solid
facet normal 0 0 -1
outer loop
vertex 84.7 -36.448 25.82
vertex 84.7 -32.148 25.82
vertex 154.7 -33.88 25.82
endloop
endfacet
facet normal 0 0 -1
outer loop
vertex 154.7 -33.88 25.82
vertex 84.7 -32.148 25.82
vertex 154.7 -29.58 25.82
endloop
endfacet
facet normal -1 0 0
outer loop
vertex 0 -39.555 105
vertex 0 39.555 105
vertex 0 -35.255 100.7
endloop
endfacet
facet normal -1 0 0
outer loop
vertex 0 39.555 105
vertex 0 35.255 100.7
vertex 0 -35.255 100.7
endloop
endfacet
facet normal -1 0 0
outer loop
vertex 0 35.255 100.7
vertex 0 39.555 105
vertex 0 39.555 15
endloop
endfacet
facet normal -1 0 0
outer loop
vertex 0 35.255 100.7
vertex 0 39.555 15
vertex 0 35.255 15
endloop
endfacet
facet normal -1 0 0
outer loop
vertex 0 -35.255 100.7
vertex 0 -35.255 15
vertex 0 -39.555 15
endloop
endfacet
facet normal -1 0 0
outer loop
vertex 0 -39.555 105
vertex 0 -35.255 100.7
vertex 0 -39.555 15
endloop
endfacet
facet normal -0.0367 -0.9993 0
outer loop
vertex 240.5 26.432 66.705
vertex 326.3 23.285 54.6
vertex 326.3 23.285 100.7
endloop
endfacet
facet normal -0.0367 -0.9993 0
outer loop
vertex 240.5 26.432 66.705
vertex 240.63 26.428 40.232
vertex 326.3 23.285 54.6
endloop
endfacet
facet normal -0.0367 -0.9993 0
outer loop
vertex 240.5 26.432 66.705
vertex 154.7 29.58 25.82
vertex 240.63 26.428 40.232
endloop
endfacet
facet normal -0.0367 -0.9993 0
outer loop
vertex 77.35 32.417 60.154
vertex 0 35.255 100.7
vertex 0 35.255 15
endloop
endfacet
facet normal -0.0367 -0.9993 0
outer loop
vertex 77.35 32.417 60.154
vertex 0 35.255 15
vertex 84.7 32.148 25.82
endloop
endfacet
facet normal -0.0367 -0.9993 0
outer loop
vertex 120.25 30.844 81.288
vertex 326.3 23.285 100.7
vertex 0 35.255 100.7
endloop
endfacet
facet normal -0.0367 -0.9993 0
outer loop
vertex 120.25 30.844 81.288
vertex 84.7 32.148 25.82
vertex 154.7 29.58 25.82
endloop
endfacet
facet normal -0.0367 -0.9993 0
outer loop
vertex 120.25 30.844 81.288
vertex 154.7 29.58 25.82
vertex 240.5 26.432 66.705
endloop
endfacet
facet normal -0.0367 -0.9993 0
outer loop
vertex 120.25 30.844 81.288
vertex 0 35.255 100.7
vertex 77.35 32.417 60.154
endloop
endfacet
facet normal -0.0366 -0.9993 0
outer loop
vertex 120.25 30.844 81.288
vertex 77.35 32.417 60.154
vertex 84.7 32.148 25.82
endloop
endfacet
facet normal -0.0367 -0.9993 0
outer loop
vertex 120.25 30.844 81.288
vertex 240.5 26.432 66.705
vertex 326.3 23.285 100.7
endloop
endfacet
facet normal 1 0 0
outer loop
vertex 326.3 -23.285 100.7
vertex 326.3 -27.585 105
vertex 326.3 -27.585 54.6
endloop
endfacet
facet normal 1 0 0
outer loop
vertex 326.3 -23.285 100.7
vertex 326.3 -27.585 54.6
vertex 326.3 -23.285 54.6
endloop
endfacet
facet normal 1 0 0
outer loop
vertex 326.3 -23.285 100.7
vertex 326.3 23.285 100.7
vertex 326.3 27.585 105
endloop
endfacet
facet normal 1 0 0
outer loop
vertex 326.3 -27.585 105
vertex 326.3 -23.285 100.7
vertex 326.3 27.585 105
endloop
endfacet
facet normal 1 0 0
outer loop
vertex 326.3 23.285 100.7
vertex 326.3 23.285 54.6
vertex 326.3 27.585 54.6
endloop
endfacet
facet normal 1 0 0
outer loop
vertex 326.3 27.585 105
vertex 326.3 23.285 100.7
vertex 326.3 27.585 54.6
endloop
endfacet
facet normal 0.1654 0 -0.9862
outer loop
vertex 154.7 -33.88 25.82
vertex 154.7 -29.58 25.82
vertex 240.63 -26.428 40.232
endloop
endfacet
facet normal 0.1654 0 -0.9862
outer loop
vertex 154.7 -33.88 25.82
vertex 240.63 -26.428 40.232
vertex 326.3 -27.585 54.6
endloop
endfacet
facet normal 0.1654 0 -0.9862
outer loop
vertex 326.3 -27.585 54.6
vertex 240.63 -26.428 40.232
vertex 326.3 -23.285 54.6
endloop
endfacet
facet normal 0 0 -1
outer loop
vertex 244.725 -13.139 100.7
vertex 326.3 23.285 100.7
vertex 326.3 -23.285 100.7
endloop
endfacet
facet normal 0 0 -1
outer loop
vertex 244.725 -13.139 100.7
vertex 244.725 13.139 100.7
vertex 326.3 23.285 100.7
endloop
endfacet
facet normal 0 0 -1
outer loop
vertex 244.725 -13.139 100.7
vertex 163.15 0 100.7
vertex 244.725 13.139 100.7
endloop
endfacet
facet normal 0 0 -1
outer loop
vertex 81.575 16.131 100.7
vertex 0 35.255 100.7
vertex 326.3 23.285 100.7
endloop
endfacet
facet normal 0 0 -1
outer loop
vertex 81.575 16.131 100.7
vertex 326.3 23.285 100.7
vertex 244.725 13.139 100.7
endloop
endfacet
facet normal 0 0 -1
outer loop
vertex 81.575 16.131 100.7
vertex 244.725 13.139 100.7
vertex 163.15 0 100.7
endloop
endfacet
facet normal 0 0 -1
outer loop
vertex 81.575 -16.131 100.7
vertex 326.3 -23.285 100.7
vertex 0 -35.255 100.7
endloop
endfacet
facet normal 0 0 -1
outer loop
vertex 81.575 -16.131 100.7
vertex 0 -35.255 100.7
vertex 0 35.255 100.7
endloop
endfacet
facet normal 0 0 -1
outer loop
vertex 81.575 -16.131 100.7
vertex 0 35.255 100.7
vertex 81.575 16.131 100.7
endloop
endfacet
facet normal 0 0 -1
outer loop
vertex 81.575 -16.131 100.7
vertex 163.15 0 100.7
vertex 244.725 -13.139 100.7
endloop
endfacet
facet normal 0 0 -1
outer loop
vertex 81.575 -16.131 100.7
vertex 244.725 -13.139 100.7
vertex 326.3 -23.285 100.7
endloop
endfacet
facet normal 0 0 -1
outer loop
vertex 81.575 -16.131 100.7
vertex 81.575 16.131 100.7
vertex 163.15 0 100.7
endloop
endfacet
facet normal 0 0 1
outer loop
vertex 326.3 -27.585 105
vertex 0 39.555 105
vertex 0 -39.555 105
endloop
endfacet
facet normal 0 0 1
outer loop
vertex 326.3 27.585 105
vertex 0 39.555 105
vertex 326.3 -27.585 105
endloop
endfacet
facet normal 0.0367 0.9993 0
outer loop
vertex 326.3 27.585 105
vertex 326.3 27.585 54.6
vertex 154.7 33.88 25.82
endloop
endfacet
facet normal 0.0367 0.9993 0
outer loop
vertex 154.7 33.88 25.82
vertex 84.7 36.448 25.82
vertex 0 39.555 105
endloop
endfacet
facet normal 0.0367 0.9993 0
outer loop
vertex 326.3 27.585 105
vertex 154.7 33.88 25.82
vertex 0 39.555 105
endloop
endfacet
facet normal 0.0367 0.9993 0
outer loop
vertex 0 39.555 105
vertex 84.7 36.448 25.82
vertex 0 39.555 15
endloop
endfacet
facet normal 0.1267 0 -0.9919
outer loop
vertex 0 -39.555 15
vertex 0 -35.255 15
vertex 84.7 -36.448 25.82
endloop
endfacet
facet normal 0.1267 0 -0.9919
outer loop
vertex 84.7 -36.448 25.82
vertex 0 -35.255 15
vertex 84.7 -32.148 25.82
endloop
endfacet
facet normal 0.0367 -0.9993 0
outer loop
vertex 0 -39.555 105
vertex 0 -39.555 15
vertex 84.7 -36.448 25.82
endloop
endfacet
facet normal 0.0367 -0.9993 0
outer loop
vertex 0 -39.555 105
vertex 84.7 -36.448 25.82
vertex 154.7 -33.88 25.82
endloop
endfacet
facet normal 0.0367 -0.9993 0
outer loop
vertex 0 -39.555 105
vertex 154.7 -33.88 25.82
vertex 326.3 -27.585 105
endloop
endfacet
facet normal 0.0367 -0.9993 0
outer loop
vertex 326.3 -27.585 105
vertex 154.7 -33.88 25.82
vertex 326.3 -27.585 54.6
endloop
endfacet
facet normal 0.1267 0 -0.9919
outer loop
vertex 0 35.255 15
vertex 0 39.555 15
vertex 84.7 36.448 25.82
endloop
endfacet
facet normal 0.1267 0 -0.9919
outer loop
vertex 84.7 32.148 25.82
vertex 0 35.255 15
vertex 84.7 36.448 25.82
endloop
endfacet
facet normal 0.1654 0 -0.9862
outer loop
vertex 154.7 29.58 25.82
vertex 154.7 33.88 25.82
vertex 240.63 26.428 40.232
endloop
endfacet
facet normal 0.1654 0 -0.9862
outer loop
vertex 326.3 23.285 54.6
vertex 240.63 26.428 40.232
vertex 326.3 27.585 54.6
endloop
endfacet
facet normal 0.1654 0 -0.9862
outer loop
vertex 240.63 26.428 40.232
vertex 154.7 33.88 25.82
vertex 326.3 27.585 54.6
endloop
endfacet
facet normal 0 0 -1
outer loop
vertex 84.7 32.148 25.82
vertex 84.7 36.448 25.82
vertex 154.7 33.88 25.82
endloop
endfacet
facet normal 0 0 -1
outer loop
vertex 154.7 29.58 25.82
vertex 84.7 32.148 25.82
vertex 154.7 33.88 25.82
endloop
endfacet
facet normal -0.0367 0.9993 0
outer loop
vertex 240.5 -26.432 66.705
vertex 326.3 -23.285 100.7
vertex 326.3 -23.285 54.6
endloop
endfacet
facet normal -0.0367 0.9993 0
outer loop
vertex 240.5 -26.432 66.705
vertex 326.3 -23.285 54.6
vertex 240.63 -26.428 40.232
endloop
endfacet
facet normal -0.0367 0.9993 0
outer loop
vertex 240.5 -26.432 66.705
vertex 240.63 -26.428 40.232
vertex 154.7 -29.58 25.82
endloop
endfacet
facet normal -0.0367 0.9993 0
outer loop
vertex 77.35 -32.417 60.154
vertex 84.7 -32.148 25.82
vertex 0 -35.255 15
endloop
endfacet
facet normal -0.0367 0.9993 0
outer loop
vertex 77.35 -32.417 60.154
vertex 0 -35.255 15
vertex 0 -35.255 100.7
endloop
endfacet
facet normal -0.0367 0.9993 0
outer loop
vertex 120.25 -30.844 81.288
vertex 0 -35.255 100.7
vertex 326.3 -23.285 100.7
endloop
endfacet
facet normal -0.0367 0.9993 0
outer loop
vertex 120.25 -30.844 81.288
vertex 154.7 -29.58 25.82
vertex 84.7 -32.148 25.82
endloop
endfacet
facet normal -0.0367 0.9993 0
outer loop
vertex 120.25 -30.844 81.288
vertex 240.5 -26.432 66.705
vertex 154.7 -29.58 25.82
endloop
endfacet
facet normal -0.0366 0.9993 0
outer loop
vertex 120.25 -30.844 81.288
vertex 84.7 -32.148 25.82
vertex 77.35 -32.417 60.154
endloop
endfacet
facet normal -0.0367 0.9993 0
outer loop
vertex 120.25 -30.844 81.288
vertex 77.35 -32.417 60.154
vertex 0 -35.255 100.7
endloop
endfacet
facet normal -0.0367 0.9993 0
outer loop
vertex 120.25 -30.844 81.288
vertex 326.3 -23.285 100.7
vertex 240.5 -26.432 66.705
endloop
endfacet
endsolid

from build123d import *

# Parameters (mm, degrees)
BOSS_EXTRUDE1_DEPTH     = 105
CUT_EXTRUDE1_DEPTH      = 105.1
CUT_EXTRUDE1_DEPTH_BACK = 105.1
SKETCH4_W               = 78.145475997
SKETCH4_H               = 46.57
SKETCH5_W               = 111.656527507
SKETCH5_H               = 70.51


with BuildPart() as part:
    # Sketch1 → Boss-Extrude1 (new body)
    with BuildSketch(Plane.XY):
        Polygon((0, 39.555), (0, -39.555), (326.3, -27.585), (326.3, 27.585), align=None)
    extrude(amount=BOSS_EXTRUDE1_DEPTH)

    # Sketch3 → Cut-Extrude1 (cut, two sides)
    with BuildSketch(Plane(origin=(0, 0, 0), x_dir=(1, 0, 0), z_dir=(0, 1, 0))) as cut_extrude1_sk:
        Polygon((0, -15), (84.7, -25.82), (154.7, -25.82), (326.3, -54.6), (326.3, 36.079011671), (0, 41.113860107), align=None)
    extrude(amount=CUT_EXTRUDE1_DEPTH, mode=Mode.SUBTRACT)
    extrude(cut_extrude1_sk.sketch, amount=-CUT_EXTRUDE1_DEPTH_BACK, mode=Mode.SUBTRACT)

    # Sketch4 → Cut-Loft1 section 0
    with BuildSketch(Plane(origin=(326.3, 0, 0), x_dir=(0, 0, -1), z_dir=(1, 0, 0))):
        with Locations((-61.627262002, 0)):
            Rectangle(SKETCH4_W, SKETCH4_H)
    # Sketch5 → Cut-Loft1 section 1
    with BuildSketch(Plane.ZY):
        with Locations((44.871736246, 0)):
            Rectangle(SKETCH5_W, SKETCH5_H)
    loft(mode=Mode.SUBTRACT)


solid = part.part
